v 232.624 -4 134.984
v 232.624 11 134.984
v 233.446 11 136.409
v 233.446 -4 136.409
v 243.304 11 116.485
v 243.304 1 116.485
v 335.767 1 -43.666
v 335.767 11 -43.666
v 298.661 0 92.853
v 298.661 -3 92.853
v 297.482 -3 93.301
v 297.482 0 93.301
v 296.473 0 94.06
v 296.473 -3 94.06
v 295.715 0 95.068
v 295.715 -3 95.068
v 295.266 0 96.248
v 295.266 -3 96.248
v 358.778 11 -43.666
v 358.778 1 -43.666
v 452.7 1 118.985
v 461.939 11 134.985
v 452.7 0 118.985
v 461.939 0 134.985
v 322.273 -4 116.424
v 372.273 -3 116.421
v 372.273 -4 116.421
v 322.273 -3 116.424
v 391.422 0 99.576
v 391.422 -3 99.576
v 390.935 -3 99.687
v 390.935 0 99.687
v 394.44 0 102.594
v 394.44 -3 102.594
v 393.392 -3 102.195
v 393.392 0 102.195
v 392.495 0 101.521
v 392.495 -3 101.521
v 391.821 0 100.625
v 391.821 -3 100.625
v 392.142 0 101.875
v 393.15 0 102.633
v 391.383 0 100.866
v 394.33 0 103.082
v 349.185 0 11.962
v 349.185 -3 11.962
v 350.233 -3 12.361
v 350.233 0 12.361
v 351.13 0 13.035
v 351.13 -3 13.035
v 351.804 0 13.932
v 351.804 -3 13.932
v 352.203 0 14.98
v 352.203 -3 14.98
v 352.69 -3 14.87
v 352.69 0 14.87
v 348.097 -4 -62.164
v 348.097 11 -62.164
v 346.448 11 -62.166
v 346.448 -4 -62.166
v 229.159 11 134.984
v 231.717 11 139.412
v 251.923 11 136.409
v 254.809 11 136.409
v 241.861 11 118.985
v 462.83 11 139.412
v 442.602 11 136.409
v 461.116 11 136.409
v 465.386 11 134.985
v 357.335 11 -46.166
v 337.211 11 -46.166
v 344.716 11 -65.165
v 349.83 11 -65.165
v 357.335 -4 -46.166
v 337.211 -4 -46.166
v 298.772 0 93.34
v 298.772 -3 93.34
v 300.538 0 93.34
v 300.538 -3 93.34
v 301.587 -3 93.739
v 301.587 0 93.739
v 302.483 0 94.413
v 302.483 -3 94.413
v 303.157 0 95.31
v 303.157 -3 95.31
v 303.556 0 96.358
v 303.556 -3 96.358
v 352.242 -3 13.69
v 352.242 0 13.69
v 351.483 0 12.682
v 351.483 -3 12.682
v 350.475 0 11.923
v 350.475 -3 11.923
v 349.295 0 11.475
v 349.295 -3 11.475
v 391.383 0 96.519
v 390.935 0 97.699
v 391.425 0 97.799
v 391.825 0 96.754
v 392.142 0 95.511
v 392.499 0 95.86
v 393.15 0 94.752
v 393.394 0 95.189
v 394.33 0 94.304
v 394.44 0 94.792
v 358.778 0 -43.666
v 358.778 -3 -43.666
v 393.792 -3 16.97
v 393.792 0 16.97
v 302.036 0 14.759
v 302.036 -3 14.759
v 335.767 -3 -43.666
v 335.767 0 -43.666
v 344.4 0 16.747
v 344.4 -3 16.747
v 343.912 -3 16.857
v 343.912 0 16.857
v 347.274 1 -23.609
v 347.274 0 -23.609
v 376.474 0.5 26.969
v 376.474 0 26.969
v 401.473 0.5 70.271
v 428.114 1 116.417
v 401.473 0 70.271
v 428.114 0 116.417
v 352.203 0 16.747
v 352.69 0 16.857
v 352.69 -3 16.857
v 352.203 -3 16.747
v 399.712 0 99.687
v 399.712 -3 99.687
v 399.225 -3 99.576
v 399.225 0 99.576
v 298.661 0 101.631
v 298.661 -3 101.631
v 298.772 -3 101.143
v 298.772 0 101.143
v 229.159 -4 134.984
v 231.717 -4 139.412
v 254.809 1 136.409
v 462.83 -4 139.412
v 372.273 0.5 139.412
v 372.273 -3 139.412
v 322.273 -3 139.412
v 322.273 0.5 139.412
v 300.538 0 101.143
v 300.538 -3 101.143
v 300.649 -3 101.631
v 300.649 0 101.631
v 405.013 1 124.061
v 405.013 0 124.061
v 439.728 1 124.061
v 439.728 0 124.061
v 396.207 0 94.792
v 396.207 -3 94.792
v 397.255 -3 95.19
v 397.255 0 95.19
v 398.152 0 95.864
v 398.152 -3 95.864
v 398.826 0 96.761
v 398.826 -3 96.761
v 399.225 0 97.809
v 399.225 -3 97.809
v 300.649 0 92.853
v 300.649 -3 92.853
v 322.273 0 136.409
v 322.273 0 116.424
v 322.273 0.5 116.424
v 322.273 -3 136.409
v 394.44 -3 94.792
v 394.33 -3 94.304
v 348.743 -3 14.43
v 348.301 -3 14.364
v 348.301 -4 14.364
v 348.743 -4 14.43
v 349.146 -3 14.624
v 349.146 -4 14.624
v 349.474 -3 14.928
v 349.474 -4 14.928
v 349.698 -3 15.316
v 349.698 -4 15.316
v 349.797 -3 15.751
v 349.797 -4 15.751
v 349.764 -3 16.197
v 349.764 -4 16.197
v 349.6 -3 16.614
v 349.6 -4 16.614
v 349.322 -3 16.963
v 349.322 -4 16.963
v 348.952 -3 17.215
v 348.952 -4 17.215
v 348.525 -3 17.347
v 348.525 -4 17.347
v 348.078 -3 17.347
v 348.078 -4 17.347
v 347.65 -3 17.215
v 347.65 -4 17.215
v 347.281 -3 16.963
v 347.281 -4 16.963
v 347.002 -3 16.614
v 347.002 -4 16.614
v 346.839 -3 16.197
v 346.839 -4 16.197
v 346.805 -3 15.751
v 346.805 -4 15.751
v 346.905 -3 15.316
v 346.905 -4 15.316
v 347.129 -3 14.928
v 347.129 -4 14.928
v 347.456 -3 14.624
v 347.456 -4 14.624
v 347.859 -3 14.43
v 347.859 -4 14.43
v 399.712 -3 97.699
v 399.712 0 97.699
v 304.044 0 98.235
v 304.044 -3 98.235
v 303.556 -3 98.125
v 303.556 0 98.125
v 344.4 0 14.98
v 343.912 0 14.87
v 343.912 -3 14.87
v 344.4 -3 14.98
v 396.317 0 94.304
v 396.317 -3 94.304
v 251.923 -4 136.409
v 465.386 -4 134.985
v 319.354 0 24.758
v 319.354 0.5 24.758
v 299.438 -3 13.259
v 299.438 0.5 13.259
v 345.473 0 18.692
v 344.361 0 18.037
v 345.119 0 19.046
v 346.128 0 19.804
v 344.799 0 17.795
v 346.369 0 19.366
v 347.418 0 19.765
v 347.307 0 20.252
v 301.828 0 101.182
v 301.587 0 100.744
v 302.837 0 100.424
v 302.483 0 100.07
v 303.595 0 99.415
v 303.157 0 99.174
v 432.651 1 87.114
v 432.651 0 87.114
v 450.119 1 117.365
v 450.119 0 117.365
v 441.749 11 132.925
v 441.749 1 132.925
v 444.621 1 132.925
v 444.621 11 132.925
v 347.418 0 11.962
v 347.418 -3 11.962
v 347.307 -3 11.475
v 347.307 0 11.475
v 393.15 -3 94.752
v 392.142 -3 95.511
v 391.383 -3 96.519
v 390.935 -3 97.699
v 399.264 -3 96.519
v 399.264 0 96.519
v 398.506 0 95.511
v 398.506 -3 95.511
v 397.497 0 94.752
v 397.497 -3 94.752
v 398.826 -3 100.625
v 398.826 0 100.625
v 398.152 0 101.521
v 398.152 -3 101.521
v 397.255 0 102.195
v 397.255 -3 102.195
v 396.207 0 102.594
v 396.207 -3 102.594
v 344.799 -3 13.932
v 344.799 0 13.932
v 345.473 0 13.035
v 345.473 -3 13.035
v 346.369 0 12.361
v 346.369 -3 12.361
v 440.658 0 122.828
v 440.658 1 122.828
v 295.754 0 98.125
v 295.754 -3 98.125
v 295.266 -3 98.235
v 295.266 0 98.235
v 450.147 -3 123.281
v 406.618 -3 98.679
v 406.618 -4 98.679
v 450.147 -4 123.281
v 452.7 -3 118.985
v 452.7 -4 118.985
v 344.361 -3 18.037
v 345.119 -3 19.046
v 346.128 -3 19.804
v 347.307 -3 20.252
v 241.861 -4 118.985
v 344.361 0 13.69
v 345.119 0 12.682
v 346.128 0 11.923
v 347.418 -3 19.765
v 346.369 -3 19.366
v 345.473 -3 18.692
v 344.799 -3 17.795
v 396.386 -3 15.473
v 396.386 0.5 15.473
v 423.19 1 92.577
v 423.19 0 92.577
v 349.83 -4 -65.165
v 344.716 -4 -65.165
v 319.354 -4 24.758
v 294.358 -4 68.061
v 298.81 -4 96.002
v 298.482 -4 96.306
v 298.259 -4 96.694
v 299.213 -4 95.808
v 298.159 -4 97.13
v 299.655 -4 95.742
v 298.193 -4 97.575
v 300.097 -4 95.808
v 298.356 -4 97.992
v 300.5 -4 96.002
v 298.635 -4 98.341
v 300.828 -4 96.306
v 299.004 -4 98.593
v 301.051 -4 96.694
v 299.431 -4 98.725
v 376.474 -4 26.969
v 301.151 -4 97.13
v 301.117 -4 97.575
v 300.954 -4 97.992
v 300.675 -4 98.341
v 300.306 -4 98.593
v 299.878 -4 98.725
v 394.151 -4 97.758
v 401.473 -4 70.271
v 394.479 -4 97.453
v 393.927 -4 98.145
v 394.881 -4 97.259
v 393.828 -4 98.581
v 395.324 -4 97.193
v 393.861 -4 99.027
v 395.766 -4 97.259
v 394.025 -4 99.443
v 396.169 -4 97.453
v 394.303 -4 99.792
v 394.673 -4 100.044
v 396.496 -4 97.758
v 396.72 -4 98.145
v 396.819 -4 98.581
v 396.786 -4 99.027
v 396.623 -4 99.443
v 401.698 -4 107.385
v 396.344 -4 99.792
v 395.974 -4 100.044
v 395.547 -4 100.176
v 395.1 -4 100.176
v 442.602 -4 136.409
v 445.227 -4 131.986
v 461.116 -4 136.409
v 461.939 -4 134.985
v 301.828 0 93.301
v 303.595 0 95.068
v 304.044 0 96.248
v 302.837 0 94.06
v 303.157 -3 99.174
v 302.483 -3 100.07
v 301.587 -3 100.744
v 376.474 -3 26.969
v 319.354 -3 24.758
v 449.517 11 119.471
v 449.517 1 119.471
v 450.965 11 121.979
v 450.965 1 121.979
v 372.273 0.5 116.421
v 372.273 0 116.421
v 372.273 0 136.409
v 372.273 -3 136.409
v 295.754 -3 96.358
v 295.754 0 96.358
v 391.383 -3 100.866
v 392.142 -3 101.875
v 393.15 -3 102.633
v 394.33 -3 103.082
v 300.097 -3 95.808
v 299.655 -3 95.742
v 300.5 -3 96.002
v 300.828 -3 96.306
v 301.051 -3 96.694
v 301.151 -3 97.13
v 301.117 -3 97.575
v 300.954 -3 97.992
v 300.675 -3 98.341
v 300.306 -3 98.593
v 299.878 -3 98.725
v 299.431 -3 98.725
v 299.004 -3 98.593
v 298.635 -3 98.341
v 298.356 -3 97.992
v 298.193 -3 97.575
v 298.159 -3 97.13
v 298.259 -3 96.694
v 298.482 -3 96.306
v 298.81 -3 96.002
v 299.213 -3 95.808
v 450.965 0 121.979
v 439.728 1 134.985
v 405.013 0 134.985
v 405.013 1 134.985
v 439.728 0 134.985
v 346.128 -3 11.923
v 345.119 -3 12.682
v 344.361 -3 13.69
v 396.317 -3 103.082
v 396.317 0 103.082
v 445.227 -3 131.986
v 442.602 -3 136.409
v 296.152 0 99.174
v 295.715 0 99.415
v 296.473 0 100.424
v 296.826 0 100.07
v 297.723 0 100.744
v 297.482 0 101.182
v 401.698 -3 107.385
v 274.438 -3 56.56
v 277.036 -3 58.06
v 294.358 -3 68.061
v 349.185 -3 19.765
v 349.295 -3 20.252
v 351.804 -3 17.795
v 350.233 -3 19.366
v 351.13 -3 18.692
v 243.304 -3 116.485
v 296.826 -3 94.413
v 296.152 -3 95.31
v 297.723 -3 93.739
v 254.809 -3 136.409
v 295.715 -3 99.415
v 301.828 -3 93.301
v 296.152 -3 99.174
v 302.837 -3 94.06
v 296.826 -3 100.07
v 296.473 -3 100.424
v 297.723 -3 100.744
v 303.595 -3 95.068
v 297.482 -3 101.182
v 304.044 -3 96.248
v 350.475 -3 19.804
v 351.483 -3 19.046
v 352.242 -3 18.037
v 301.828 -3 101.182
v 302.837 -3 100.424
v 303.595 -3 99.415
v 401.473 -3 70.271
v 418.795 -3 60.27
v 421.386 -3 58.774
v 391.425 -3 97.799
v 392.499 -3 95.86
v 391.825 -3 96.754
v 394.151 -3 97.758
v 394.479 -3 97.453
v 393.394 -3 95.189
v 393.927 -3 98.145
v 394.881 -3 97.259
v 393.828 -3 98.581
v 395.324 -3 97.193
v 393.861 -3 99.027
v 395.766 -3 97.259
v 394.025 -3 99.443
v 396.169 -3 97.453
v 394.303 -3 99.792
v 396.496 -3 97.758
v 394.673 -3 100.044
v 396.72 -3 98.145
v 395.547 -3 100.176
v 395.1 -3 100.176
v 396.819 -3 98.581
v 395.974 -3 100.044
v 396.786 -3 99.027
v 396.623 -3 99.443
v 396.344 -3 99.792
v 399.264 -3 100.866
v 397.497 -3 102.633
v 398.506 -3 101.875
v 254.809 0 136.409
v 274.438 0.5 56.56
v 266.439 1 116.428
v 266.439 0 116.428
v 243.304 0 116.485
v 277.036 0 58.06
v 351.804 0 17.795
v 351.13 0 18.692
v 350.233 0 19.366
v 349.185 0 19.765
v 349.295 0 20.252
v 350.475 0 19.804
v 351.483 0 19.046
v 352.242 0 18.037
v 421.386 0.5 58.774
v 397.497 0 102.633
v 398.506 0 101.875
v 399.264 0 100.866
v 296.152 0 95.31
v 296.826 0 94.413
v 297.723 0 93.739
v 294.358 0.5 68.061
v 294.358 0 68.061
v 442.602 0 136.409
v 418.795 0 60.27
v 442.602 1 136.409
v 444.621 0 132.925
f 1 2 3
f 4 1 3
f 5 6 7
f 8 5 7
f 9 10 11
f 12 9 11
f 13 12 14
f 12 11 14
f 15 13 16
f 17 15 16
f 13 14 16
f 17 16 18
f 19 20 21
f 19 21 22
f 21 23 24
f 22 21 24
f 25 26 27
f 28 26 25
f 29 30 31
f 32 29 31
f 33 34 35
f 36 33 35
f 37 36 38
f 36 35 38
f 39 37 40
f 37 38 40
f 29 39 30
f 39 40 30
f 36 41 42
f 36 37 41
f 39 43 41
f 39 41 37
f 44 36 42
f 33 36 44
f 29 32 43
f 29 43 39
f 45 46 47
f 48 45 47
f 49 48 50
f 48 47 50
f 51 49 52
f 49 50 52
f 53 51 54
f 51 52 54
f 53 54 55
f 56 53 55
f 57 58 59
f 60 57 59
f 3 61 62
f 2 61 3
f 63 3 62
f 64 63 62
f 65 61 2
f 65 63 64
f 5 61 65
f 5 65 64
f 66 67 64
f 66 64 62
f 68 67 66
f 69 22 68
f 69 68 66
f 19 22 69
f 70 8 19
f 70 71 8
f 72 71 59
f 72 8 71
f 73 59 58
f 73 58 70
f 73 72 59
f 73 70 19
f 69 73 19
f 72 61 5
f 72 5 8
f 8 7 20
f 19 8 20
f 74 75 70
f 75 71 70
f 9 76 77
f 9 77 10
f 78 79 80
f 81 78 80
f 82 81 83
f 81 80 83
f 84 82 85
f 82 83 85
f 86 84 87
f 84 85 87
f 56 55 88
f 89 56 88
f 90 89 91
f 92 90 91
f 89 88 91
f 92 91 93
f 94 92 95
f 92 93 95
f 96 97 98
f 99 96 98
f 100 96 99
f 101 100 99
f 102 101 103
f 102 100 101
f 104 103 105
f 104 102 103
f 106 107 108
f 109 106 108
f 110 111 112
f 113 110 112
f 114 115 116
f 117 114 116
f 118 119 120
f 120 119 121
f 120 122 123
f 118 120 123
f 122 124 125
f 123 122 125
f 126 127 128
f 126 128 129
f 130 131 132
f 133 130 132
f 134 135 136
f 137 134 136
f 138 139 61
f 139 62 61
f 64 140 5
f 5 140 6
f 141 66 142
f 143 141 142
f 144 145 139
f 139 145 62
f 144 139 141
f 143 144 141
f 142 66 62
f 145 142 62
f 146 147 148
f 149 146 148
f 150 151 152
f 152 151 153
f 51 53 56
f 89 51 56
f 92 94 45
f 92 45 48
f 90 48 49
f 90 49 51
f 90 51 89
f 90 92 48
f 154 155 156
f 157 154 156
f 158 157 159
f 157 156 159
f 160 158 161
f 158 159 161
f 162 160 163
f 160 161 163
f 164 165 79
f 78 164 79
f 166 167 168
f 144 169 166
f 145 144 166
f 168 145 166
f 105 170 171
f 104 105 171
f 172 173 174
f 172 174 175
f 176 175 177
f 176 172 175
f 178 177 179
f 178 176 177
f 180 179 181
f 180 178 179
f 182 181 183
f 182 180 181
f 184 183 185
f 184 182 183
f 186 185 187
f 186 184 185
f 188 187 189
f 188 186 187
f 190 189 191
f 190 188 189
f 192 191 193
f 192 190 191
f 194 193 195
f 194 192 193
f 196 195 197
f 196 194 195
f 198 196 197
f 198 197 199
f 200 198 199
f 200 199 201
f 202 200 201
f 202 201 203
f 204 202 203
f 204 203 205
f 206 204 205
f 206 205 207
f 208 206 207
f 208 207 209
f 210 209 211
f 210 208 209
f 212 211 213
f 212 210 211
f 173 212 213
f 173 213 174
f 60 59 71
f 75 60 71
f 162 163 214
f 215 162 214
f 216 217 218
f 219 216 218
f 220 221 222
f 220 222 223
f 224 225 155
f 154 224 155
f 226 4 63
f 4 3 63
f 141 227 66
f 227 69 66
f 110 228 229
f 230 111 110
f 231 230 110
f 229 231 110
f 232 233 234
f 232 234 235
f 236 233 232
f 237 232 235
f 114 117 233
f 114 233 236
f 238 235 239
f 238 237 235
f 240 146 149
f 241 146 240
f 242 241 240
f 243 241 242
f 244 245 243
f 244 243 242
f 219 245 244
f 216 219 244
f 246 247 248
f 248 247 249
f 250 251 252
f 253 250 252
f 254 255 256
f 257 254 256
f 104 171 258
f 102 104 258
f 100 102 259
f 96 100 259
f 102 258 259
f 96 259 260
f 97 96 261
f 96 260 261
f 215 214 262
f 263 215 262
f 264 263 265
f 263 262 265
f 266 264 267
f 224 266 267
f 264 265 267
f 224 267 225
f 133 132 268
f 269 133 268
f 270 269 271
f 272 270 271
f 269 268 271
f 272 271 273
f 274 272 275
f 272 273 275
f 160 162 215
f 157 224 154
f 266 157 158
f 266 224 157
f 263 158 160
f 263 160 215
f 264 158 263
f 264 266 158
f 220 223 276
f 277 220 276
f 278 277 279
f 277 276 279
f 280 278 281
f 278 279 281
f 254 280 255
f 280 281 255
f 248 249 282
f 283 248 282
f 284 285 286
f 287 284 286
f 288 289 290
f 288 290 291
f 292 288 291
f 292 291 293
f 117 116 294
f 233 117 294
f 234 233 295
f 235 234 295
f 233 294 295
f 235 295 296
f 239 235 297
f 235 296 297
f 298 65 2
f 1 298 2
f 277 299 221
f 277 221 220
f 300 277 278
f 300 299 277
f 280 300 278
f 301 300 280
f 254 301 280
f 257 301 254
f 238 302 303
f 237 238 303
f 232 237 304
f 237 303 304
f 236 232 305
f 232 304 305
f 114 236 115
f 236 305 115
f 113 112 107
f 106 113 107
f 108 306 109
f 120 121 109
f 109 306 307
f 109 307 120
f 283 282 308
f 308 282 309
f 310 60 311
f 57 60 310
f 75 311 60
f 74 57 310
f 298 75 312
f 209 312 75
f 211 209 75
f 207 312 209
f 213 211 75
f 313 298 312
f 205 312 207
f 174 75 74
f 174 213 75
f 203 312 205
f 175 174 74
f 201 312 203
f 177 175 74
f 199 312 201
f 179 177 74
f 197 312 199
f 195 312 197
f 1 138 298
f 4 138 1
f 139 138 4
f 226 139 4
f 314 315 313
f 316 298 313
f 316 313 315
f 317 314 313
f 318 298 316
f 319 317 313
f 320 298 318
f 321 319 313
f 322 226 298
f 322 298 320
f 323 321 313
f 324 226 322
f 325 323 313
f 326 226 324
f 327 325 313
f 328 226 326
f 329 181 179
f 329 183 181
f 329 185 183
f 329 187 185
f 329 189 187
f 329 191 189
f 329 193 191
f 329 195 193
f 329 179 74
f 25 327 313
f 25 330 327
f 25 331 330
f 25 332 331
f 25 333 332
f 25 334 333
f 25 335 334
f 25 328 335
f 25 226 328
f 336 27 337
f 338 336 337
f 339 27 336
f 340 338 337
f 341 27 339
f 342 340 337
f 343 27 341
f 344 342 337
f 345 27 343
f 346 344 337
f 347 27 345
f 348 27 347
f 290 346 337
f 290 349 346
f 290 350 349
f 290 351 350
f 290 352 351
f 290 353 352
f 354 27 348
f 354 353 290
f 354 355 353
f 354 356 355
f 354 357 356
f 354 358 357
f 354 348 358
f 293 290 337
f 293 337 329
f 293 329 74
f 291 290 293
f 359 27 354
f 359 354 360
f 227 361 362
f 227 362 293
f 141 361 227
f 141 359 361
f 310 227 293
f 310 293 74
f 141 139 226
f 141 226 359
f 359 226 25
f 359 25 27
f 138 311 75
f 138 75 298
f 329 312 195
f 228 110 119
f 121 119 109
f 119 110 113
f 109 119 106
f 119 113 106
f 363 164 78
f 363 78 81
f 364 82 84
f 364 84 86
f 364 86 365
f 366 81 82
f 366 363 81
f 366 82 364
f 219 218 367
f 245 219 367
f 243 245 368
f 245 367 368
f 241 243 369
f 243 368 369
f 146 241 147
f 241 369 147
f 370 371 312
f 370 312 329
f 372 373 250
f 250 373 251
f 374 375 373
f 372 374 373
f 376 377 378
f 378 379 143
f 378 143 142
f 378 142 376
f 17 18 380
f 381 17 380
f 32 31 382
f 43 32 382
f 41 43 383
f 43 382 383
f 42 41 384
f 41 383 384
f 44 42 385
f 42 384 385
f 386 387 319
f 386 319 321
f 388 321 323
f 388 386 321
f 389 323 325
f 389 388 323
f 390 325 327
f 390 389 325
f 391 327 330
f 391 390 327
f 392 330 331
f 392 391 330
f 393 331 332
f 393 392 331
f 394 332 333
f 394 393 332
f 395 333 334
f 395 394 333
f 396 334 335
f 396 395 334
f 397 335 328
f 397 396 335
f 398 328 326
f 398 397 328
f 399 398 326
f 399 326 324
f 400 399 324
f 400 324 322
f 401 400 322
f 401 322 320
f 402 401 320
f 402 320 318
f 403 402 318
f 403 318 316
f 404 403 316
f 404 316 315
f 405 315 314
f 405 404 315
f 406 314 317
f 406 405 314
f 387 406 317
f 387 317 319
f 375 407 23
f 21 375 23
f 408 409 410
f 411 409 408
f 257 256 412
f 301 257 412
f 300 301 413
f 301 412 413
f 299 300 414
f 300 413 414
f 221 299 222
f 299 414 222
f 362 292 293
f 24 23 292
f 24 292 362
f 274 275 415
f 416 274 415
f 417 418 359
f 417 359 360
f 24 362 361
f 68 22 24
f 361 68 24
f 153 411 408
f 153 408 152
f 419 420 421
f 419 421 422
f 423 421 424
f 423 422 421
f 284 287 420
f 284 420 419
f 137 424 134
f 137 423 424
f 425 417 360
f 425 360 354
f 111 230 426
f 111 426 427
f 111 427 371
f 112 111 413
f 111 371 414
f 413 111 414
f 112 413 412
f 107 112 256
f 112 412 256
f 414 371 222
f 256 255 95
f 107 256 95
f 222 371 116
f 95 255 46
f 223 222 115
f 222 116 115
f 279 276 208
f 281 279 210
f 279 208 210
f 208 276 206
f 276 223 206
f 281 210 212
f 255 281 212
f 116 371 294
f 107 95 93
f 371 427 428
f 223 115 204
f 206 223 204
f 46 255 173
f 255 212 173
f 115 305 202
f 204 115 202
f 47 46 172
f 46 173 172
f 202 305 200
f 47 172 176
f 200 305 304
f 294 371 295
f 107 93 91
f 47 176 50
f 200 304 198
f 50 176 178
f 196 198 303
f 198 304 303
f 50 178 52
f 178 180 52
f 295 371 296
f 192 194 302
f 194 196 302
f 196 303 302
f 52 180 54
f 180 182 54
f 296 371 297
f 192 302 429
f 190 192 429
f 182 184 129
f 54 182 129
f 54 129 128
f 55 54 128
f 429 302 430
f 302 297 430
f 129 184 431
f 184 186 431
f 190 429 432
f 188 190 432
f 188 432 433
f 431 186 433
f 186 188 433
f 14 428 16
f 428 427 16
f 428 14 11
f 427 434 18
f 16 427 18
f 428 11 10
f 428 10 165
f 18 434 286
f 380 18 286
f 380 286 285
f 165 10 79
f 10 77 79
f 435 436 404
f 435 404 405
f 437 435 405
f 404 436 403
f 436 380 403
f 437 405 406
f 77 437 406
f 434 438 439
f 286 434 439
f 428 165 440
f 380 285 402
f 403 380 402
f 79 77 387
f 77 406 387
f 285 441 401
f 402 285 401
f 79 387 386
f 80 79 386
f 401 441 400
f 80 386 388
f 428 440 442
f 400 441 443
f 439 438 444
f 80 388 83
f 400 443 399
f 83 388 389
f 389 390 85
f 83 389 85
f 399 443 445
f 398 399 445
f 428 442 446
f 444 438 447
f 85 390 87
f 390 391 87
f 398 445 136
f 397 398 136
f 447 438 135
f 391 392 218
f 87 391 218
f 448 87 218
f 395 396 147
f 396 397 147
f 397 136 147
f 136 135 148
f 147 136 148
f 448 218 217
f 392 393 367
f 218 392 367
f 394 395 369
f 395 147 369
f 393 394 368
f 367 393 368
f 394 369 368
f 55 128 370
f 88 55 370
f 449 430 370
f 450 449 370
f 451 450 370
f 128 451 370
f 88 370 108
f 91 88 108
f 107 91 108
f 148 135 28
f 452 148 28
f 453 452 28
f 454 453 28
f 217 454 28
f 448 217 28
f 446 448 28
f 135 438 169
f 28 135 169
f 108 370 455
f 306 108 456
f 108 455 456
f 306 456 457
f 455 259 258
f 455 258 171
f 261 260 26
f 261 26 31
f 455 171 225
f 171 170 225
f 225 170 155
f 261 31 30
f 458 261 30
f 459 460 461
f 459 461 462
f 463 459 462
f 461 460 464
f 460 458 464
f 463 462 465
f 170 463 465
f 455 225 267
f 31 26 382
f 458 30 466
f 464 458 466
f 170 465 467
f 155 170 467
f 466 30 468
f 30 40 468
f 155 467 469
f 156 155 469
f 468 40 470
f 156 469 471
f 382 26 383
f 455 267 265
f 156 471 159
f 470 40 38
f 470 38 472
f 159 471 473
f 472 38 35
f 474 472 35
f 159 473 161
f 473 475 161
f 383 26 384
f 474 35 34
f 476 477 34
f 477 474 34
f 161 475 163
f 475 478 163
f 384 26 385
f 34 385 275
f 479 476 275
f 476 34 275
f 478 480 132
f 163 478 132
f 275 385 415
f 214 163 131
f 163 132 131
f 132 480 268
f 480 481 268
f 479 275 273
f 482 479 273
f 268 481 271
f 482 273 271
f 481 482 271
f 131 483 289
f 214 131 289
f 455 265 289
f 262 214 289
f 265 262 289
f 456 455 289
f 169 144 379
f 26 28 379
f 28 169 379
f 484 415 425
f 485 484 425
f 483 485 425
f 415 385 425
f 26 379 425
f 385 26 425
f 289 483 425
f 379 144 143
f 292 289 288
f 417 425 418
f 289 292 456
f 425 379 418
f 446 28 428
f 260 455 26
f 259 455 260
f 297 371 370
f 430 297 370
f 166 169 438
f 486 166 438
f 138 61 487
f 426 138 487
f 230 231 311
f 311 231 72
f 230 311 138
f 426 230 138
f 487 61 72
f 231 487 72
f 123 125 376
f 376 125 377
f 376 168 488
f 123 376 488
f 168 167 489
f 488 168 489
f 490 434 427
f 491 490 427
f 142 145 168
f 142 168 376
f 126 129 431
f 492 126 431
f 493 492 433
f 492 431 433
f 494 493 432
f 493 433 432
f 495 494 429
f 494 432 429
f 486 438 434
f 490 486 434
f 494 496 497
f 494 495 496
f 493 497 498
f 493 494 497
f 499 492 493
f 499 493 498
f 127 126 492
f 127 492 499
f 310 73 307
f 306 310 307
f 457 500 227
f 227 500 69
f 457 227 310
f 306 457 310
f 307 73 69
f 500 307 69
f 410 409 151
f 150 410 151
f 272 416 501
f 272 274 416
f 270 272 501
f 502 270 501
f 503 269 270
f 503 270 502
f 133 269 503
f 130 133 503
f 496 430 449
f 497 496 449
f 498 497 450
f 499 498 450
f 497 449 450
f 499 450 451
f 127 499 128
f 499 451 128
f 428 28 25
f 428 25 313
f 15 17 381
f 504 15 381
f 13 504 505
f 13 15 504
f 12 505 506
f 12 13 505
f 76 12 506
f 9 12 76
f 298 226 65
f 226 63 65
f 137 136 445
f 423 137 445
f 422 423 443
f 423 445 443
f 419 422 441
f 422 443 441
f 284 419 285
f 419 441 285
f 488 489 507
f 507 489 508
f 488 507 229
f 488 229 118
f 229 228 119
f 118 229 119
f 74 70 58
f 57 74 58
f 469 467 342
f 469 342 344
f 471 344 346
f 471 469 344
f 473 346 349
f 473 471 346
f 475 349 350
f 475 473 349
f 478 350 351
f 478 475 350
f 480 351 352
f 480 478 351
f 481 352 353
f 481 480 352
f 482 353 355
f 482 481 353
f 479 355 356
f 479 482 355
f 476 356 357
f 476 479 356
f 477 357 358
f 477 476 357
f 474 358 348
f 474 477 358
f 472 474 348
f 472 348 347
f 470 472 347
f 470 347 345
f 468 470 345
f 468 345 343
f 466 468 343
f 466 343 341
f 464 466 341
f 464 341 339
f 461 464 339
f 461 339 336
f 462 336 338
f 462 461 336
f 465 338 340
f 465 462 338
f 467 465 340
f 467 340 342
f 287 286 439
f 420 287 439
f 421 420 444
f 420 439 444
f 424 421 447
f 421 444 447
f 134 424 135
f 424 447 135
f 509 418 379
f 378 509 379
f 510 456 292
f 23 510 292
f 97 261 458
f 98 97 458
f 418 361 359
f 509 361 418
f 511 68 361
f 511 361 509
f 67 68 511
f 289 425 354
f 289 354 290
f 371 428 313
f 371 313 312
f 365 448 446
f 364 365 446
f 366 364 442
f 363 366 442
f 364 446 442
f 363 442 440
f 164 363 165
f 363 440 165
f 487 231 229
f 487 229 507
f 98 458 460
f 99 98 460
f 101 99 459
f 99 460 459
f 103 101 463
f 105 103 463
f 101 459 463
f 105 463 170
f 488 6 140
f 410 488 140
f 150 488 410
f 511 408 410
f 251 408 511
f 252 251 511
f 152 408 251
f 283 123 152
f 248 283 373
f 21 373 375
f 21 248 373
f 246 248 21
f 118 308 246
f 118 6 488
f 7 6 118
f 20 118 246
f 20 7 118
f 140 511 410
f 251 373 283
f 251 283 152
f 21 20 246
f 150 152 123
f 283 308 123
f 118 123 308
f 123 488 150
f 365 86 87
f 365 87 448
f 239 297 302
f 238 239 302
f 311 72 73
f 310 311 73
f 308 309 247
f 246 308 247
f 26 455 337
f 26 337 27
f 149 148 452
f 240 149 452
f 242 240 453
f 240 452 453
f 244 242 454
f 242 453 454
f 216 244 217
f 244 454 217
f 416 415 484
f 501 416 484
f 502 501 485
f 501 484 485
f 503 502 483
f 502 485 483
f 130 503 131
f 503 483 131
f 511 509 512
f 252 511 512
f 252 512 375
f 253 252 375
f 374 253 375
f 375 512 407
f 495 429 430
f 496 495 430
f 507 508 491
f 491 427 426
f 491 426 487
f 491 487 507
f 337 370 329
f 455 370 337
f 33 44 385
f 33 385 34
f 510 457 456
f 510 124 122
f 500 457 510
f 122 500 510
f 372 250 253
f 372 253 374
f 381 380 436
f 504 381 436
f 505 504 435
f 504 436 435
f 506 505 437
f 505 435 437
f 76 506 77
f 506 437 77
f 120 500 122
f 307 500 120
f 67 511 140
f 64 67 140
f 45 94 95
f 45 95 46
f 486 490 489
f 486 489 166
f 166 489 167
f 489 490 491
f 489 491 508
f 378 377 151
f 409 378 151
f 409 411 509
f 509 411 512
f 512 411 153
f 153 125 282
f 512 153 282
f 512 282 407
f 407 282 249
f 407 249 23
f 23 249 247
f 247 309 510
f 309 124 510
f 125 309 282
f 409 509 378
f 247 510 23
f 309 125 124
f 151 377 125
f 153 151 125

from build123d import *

# Parameters (mm, degrees)
SKETCH1_W                = 34.714871787
SKETCH1_H                = 10.923666426
BOSS_EXTRUDE1_DEPTH      = 1
BOSS_EXTRUDE2_DEPTH      = 11
BOSS_EXTRUDE3_DEPTH      = 5
BOSS_EXTRUDE3_DEPTH_BACK = 3
SKETCH3_W                = 50
SKETCH3_H                = 7
CUT_EXTRUDE3_DEPTH       = 25
SKETCH5_W                = 50
SKETCH5_H                = 7
CUT_EXTRUDE4_DEPTH       = 25
SKETCH6_W                = 50
SKETCH6_H                = 7
CUT_EXTRUDE5_DEPTH       = 25
SKETCH8_R                = 1.5
BOSS_EXTRUDE5_DEPTH      = 1
BOSS_EXTRUDE10_DEPTH     = 3


with BuildPart() as part:
    # Sketch1 → Boss-Extrude1 (new body)
    with BuildSketch(Plane(origin=(0, 0, 0), x_dir=(1, 0, 0), z_dir=(0, 1, 0))):
        Polygon((243.304219775, -116.484791865), (254.809280577, -136.408896137), (442.602090749, -136.409305398), (444.621046679, -132.925433224), (441.749040748, -132.925433224), (449.516726724, -119.471406458), (450.964695298, -121.978953123), (452.699916622, -118.984688018), (358.778179036, 43.666038065), (335.767496284, 43.666038065), align=None)
        with Locations((422.370878913, -129.522754792)):
            Rectangle(SKETCH1_W, SKETCH1_H, mode=Mode.SUBTRACT)
        Polygon((423.190377512, -92.577472767), (432.651287025, -87.114324326), (450.119365975, -117.364996826), (440.658456462, -122.828145267), align=None, mode=Mode.SUBTRACT)
        Polygon((428.113670919, -116.417164681), (266.439108268, -116.428009237), (347.273609729, 23.609230821), align=None, mode=Mode.SUBTRACT)
    extrude(amount=BOSS_EXTRUDE1_DEPTH)

    # Sketch1<9> → Boss-Extrude2 (add)
    # profile 1 of 2: a face of its own
    with BuildSketch(Plane(origin=(0, 0, 0), x_dir=(1, 0, 0), z_dir=(0, 1, 0))):
        Polygon((229.159432548, -134.984249184), (231.716666588, -139.412373829), (462.829865412, -139.412373829), (465.38624875, -134.984588004), (349.829542096, 65.165499075), (344.716133219, 65.165499075), align=None)
        Polygon((251.922647989, -136.409305399), (233.446303401, -136.408896138), (232.62355396, -134.984217357), (241.860901689, -118.984688018), align=None, mode=Mode.SUBTRACT)
        Polygon((442.602090749, -136.409305398), (254.809280577, -136.408896137), (243.304219775, -116.484791865), (335.767496284, 43.666038065), (358.778179036, 43.666038065), (461.938967958, -134.984588006), (461.116393749, -136.409305398), align=None, mode=Mode.SUBTRACT)
        Polygon((348.096628302, 62.164013367), (357.334800991, 46.166038067), (337.210874326, 46.166038067), (346.44844193, 62.165948237), align=None, mode=Mode.SUBTRACT)
    # profile 2 of 2: a face of its own
    with BuildSketch(Plane(origin=(0, 0, 0), x_dir=(1, 0, 0), z_dir=(0, 1, 0))):
        Polygon((441.749040748, -132.925433224), (444.621046679, -132.925433224), (450.964695298, -121.978953123), (449.516726724, -119.471406458), align=None)
    extrude(amount=BOSS_EXTRUDE2_DEPTH)

    # Sketch1<10> → Boss-Extrude3 (add, two sides: drawn at the far end of the back side and taken through both)
    with BuildSketch(Plane(origin=(0, 0, 0), x_dir=(1, 0, 0), z_dir=(0, 1, 0)).offset(-BOSS_EXTRUDE3_DEPTH_BACK)):
        Polygon((229.159432548, -134.984249184), (231.716666588, -139.412373829), (462.829865412, -139.412373829), (465.38624875, -134.984588004), (349.829542096, 65.165499075), (344.716133219, 65.165499075), align=None)
        Polygon((251.922647989, -136.409305399), (233.446303401, -136.408896138), (232.62355396, -134.984217357), (241.860901689, -118.984688018), align=None, mode=Mode.SUBTRACT)
        Polygon((442.602090749, -136.409305398), (254.809280577, -136.408896137), (243.304219775, -116.484791865), (335.767496284, 43.666038065), (358.778179036, 43.666038065), (452.699916622, -118.984688018), (461.938967958, -134.984588006), (461.116393749, -136.409305398), align=None, mode=Mode.SUBTRACT)
        Polygon((348.096628302, 62.164013367), (357.334800991, 46.166038067), (337.210874326, 46.166038067), (346.44844193, 62.165948237), align=None, mode=Mode.SUBTRACT)
    extrude(amount=BOSS_EXTRUDE3_DEPTH + BOSS_EXTRUDE3_DEPTH_BACK)

    # Sketch3 → Cut-Extrude3 (cut)
    with BuildSketch(Plane(origin=(290.589645397, 0, -167.772009994), x_dir=(-0.49999999999998745, 0, -0.8660254037844459), z_dir=(0.8660254037844459, 0, -0.49999999999998745))):
        with Locations((-236.592990632, -3)):
            Rectangle(SKETCH3_W, SKETCH3_H)
    extrude(amount=-CUT_EXTRUDE3_DEPTH, mode=Mode.SUBTRACT)

    # Sketch5 → Cut-Extrude4 (cut)
    with BuildSketch(Plane.XY.offset(139.412373829)):
        with Locations((347.273266, -3)):
            Rectangle(SKETCH5_W, SKETCH5_H)
    extrude(amount=-CUT_EXTRUDE4_DEPTH, mode=Mode.SUBTRACT)

    # Sketch6 → Cut-Extrude5 (cut)
    with BuildSketch(Plane(origin=(230.319375798, 0, 132.975171837), x_dir=(-0.5000006154012504, 0, 0.8660250484820695), z_dir=(-0.8660250484820695, 0, -0.5000006154012504))):
        with Locations((-113.236674799, -3)):
            Rectangle(SKETCH6_W, SKETCH6_H)
    extrude(amount=-CUT_EXTRUDE5_DEPTH, mode=Mode.SUBTRACT)

    # Sketch8 → Boss-Extrude5 (add)
    with BuildSketch(Plane.XZ.offset(3)):
        Polygon((349.829542096, -65.165499075), (465.38624875, 134.984588004), (462.829865412, 139.412373829), (231.716666588, 139.412373829), (229.159432548, 134.984249184), (344.716133219, -65.165499075), align=None)
        with Locations((395.323540807, 98.692824234)):
            Circle(SKETCH8_R, mode=Mode.SUBTRACT)
        with Locations((348.301285091, 15.863526629)):
            Circle(SKETCH8_R, mode=Mode.SUBTRACT)
        with Locations((299.654911442, 97.24168178)):
            Circle(SKETCH8_R, mode=Mode.SUBTRACT)
        Polygon((450.14703547, 123.280701064), (452.699916622, 118.984688018), (461.938967958, 134.984588006), (461.116393749, 136.409305398), (442.602090749, 136.409305398), (445.226665069, 131.986443715), (401.697951811, 107.384591709), (406.618322213, 98.678849058), align=None, mode=Mode.SUBTRACT)
        Polygon((322.273266, 116.42426408), (294.358218631, 68.061097964), (319.354499367, 24.757680453), (376.473657316, 26.969372806), (401.47267951, 70.271207531), (372.273266, 116.420910257), align=None, mode=Mode.SUBTRACT)
        Polygon((233.446303401, 136.408896138), (251.922647989, 136.409305399), (241.860901689, 118.984688018), (232.62355396, 134.984217357), align=None, mode=Mode.SUBTRACT)
        Polygon((337.210874326, -46.166038067), (357.334800991, -46.166038067), (348.096628302, -62.164013367), (346.44844193, -62.165948237), align=None, mode=Mode.SUBTRACT)
    extrude(amount=BOSS_EXTRUDE5_DEPTH)

    # Sketch12 → Boss-Extrude10 (add)
    with BuildSketch(Plane(origin=(0, -3, 0), x_dir=(1, 0, 0), z_dir=(0, 1, 0))):
        with BuildLine():
            ThreePointArc((352.690173981, -14.869718639), (351.483265607, -12.681546114), (349.295093082, -11.47463774))
            Line((349.295093081, -11.47463774), (349.184669971, -11.962292061))
            ThreePointArc((349.184669972, -11.962292061), (351.129712216, -13.035099504), (352.20251966, -14.980141749))
            Line((352.202519659, -14.980141749), (352.69017398, -14.869718639))
        make_face()
        with BuildLine():
            Line((347.417900211, -11.962292061), (347.307477101, -11.47463774))
            ThreePointArc((347.307477101, -11.47463774), (345.119304576, -12.681546114), (343.912396202, -14.869718639))
            Line((343.912396203, -14.869718639), (344.400050524, -14.980141749))
            ThreePointArc((344.400050523, -14.980141749), (345.472857967, -13.035099504), (347.417900211, -11.962292061))
        make_face()
        with BuildLine():
            ThreePointArc((349.295093082, -20.252415518), (351.483265607, -19.045507145), (352.690173981, -16.857334619))
            Line((352.69017398, -16.857334619), (352.202519659, -16.746911509))
            ThreePointArc((352.20251966, -16.746911509), (351.129712216, -18.691953754), (349.184669972, -19.764761197))
            Line((349.184669971, -19.764761197), (349.295093081, -20.252415518))
        make_face()
        with BuildLine():
            Line((344.400050524, -16.746911509), (343.912396203, -16.857334619))
            ThreePointArc((343.912396202, -16.857334619), (345.119304576, -19.045507145), (347.307477101, -20.252415518))
            Line((347.307477101, -20.252415518), (347.417900211, -19.764761197))
            ThreePointArc((347.417900211, -19.764761197), (345.472857967, -18.691953754), (344.400050523, -16.746911509))
        make_face()
        with BuildLine():
            Line((394.440155927, -94.791589666), (394.329732817, -94.303935345))
            ThreePointArc((394.329732817, -94.303935345), (392.141560292, -95.510843718), (390.934651918, -97.699016244))
            Line((390.934651918, -97.699016244), (391.4247896, -97.798542945))
            ThreePointArc((391.4247896, -97.798542945), (392.499067689, -95.860448622), (394.440155927, -94.791589666))
        make_face()
        with BuildLine():
            ThreePointArc((399.712429696, -97.699016244), (398.505521323, -95.510843718), (396.317348797, -94.303935345))
            Line((396.317348797, -94.303935345), (396.206925687, -94.791589666))
            ThreePointArc((396.206925687, -94.791589666), (398.151967932, -95.864397109), (399.224775375, -97.809439354))
            Line((399.224775375, -97.809439354), (399.712429696, -97.699016244))
        make_face()
        with BuildLine():
            Line((391.422306239, -99.576209114), (390.934651918, -99.686632224))
            ThreePointArc((390.934651918, -99.686632224), (392.141560292, -101.874804749), (394.329732817, -103.081713123))
            Line((394.329732817, -103.081713122), (394.440155927, -102.594058801))
            ThreePointArc((394.440155927, -102.594058802), (392.495113682, -101.521251358), (391.422306239, -99.576209114))
        make_face()
        with BuildLine():
            ThreePointArc((396.317348797, -103.081713123), (398.505521323, -101.874804749), (399.712429696, -99.686632224))
            Line((399.712429696, -99.686632224), (399.224775375, -99.576209114))
            ThreePointArc((399.224775375, -99.576209114), (398.151967932, -101.521251358), (396.206925687, -102.594058802))
            Line((396.206925687, -102.594058801), (396.317348797, -103.081713122))
        make_face()
        with BuildLine():
            ThreePointArc((298.661103452, -92.852792892), (296.472930927, -94.059701265), (295.266022553, -96.24787379))
            Line((295.266022553, -96.24787379), (295.753676874, -96.3582969))
            ThreePointArc((295.753676874, -96.3582969), (296.826484317, -94.413254656), (298.771526562, -93.340447213))
            Line((298.771526562, -93.340447212), (298.661103452, -92.852792891))
        make_face()
        with BuildLine():
            Line((295.753676874, -98.12506666), (295.266022553, -98.23548977))
            ThreePointArc((295.266022553, -98.23548977), (296.472930927, -100.423662295), (298.661103452, -101.630570669))
            Line((298.661103452, -101.630570669), (298.771526562, -101.142916348))
            ThreePointArc((298.771526562, -101.142916348), (296.826484317, -100.070108905), (295.753676874, -98.12506666))
        make_face()
        with BuildLine():
            ThreePointArc((304.04380033, -96.24787379), (302.836891957, -94.059701265), (300.648719432, -92.852792892))
            Line((300.648719432, -92.852792891), (300.538296322, -93.340447212))
            ThreePointArc((300.538296322, -93.340447213), (302.483338566, -94.413254656), (303.55614601, -96.3582969))
            Line((303.55614601, -96.3582969), (304.043800331, -96.24787379))
        make_face()
        with BuildLine():
            Line((300.538296322, -101.142916348), (300.648719432, -101.630570669))
            ThreePointArc((300.648719432, -101.630570669), (302.836891957, -100.423662295), (304.04380033, -98.23548977))
            Line((304.043800331, -98.23548977), (303.55614601, -98.12506666))
            ThreePointArc((303.55614601, -98.12506666), (302.483338566, -100.070108905), (300.538296322, -101.142916348))
        make_face()
    extrude(amount=BOSS_EXTRUDE10_DEPTH)


solid = part.part
